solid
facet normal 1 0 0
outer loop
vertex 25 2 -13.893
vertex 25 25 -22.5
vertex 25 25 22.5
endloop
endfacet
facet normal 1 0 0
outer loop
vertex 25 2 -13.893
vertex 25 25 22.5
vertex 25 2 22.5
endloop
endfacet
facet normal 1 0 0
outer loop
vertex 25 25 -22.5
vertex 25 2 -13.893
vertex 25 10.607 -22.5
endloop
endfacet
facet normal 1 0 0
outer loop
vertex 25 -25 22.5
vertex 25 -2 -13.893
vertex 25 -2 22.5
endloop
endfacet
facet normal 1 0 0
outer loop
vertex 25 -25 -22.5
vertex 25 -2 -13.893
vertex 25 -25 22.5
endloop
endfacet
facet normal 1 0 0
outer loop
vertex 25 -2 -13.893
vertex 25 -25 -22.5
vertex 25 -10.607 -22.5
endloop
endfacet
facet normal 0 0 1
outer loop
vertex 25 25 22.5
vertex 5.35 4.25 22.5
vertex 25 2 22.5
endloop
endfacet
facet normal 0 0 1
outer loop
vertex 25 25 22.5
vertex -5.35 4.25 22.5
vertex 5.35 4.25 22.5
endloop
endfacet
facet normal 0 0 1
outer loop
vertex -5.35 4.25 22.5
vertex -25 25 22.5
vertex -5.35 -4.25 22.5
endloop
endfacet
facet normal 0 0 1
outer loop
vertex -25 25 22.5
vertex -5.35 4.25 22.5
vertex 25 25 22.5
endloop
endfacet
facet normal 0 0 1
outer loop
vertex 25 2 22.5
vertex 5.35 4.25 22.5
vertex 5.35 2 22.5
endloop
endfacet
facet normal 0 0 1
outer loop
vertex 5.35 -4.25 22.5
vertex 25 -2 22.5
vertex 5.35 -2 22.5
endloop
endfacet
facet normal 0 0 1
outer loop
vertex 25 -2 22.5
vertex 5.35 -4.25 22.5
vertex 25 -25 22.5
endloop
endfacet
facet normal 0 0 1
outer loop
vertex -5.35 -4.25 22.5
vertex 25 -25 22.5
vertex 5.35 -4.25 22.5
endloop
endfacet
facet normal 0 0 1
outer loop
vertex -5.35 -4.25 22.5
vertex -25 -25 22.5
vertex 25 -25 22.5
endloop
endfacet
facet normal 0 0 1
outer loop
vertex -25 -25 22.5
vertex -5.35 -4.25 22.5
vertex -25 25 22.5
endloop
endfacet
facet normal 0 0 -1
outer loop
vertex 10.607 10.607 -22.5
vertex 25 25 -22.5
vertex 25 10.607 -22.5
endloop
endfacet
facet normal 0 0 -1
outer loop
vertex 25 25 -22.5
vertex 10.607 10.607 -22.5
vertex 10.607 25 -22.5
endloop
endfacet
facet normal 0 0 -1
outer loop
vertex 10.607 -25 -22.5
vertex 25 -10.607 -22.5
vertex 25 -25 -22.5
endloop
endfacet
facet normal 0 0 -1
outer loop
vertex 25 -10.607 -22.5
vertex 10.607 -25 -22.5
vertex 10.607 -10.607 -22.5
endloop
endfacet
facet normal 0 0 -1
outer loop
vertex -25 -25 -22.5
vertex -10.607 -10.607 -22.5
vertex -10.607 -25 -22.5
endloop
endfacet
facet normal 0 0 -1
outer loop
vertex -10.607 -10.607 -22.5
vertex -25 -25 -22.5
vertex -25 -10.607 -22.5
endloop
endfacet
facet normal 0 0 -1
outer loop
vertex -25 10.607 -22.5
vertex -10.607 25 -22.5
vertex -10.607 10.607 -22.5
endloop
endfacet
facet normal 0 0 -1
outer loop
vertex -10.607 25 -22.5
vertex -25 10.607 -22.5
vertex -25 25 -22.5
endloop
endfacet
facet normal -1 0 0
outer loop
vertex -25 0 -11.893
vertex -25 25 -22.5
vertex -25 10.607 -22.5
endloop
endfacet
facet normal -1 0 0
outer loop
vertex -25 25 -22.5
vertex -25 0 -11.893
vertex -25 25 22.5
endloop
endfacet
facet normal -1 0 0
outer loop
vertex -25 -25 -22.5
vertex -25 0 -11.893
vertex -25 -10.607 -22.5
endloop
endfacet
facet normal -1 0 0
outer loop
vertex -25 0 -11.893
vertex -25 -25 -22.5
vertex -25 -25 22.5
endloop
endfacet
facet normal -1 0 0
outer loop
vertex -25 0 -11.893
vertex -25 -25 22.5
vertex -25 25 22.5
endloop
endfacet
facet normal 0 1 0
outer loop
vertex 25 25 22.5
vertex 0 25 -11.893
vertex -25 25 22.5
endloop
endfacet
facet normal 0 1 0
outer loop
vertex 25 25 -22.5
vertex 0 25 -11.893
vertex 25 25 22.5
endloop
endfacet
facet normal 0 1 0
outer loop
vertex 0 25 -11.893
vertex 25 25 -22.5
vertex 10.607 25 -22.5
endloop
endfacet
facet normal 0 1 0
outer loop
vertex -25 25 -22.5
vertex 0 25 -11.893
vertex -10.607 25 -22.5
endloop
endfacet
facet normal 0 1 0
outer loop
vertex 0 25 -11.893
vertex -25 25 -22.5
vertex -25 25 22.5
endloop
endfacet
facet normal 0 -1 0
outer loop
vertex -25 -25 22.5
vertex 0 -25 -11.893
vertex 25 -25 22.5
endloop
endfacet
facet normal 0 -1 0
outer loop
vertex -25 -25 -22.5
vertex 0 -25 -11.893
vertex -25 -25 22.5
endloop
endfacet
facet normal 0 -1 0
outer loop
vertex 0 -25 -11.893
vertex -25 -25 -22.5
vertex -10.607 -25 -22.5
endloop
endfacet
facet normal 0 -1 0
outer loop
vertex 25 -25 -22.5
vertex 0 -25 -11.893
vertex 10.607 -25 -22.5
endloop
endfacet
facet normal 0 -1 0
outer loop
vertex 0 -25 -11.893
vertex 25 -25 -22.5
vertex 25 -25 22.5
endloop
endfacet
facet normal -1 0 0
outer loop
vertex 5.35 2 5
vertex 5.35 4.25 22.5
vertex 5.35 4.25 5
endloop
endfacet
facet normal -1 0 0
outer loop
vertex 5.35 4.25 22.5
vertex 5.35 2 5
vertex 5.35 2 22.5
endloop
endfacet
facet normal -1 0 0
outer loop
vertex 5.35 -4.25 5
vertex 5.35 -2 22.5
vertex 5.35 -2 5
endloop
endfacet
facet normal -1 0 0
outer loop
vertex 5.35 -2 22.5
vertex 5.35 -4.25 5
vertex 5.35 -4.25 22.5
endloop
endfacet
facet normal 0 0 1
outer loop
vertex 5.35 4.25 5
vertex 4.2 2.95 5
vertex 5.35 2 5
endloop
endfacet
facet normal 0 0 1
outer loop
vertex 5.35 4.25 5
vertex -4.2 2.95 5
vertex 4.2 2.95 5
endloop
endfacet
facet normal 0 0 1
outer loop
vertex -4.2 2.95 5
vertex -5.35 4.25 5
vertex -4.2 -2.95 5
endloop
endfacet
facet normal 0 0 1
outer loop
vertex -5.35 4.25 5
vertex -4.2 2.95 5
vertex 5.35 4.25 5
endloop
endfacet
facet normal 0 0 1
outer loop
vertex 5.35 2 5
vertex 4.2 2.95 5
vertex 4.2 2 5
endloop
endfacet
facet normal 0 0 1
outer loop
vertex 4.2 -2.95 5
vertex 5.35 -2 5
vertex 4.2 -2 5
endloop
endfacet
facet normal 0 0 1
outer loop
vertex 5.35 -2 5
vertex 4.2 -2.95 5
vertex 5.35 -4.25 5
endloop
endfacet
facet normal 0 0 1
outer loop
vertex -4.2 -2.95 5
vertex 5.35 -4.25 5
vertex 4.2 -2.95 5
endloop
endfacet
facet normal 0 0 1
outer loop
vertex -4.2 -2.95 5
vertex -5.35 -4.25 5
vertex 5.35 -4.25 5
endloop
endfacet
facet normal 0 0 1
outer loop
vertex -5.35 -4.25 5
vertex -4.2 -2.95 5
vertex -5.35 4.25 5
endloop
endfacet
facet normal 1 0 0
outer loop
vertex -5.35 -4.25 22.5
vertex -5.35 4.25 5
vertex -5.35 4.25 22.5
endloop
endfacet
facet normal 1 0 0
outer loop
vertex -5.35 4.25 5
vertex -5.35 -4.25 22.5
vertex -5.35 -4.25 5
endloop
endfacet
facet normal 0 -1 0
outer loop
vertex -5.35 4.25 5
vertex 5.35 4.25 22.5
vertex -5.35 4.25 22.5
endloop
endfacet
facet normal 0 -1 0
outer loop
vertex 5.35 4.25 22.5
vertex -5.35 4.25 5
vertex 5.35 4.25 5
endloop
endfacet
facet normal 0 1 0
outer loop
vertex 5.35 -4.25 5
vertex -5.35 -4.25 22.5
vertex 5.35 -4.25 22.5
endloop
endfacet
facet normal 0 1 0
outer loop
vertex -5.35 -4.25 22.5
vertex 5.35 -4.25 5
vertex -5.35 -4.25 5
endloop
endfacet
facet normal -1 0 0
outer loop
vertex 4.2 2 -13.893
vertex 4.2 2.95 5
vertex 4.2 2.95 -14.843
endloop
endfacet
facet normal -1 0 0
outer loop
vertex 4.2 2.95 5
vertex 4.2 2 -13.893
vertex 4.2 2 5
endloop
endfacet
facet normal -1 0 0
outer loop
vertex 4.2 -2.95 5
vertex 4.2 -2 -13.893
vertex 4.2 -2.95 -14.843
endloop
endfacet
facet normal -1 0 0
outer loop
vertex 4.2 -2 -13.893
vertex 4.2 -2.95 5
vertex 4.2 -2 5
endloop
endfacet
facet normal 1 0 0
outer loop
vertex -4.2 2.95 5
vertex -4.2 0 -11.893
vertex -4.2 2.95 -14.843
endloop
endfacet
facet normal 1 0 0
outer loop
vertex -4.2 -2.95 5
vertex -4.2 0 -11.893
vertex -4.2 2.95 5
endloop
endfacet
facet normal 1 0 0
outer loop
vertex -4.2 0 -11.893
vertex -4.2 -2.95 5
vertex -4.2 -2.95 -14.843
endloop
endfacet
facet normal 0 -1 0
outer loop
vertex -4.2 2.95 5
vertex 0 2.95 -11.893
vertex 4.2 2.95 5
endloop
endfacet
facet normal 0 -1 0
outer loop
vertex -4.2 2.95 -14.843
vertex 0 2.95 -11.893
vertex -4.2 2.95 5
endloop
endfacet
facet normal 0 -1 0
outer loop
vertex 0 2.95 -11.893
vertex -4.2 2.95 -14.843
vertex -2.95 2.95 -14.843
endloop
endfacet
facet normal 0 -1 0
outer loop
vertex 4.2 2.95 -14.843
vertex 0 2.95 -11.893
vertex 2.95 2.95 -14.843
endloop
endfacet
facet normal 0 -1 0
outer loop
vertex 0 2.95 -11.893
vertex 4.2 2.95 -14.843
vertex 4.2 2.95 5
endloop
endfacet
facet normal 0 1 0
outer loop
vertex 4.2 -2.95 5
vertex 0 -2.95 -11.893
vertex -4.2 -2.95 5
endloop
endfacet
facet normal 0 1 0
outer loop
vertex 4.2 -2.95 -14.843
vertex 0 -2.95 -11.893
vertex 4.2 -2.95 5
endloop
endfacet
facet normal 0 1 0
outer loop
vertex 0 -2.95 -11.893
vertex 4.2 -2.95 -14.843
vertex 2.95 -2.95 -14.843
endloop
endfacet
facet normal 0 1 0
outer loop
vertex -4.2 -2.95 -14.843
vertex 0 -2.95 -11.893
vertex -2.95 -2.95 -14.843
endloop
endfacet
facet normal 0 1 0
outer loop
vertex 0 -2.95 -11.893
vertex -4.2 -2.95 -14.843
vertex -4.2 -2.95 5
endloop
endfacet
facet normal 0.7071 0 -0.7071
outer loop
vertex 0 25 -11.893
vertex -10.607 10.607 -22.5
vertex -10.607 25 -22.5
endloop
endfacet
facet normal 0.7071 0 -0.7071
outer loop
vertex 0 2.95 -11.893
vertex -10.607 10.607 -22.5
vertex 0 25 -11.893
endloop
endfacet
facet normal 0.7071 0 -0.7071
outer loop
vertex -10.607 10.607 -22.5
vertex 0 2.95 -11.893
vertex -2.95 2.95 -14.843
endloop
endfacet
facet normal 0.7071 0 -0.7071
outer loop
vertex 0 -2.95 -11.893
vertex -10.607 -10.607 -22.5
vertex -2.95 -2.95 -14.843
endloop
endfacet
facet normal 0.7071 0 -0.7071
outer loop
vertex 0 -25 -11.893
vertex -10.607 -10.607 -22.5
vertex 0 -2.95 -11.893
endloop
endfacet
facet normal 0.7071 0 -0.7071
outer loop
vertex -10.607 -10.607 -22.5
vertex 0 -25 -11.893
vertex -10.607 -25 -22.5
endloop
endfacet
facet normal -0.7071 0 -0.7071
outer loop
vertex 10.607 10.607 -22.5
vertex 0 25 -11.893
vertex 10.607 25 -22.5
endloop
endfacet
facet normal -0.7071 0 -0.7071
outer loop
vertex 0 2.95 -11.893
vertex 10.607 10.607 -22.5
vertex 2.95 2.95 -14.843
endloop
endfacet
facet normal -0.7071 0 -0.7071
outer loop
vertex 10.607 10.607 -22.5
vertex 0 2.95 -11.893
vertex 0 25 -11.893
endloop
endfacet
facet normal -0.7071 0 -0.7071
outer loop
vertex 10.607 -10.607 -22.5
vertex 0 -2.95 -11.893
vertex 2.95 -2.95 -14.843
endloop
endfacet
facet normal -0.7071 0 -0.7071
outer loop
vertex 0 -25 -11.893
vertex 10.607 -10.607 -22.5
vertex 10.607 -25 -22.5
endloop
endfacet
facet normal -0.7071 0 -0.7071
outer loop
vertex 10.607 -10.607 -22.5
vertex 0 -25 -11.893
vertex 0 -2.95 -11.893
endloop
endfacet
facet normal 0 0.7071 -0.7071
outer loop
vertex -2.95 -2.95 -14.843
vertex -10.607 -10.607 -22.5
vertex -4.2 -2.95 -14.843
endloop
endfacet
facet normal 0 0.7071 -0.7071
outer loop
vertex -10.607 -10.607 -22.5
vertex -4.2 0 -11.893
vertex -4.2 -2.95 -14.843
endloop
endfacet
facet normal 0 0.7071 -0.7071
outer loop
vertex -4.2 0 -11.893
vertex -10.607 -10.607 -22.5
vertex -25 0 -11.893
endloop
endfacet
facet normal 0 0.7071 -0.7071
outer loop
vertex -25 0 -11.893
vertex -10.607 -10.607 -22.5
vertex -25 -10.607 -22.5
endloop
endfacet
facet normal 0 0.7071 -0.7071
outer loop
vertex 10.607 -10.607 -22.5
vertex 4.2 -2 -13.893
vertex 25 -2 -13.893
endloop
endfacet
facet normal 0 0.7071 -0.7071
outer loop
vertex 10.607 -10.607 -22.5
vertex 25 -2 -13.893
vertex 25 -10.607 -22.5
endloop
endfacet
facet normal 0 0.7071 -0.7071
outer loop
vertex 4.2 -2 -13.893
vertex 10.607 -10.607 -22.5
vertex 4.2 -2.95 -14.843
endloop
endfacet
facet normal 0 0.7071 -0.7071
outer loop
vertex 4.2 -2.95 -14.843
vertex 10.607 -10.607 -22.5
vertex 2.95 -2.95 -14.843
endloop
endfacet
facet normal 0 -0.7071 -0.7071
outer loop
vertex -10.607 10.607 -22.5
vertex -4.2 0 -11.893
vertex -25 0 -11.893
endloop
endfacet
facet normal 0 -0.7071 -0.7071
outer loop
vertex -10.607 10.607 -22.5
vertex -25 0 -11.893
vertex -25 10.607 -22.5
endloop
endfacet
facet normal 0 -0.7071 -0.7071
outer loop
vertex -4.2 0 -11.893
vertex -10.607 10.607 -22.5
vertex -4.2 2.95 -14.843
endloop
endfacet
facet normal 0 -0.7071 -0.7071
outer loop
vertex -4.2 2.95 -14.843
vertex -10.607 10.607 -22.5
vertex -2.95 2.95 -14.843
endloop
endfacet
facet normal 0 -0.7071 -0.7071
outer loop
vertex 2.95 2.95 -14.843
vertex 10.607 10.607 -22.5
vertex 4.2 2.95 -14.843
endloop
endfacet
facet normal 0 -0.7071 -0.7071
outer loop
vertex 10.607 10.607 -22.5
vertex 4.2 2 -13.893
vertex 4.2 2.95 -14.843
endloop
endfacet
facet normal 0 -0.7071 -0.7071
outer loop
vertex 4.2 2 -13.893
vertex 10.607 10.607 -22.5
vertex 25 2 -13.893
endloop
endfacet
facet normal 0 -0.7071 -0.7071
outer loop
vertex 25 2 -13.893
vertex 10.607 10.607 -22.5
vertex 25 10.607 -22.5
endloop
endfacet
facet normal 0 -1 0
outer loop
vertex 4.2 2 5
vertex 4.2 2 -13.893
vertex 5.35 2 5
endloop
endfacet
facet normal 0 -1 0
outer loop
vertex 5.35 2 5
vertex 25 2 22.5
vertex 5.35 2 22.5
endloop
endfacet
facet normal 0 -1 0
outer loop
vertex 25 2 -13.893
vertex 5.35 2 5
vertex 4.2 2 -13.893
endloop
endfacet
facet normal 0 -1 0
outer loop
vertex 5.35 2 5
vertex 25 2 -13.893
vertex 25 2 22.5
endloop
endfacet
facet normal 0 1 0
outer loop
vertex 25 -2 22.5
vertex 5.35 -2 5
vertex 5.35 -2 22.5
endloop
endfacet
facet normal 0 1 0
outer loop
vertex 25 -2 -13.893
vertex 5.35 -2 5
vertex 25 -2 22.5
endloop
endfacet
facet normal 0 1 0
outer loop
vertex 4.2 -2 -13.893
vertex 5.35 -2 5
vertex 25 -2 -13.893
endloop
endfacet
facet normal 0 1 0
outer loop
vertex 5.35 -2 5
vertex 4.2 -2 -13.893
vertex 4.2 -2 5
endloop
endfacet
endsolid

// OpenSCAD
// Phone Charging Holder
// by SrAmo, 12/15/2021

height = 45;
cut = 15;
difference() {
    cube([50,50,height],center=true);
    
    translate([0,0,height/2-10+2.5]) cube([10.7,8.5,20],center=true);
    cube([8.4,5.9,height+5],center=true);
    translate([0,0,-height/2]) rotate([90,45,0]) cube([cut,cut,55],center=true);
    translate([0,0,-height/2]) rotate([0,90,0]) rotate([0,0,45]) cube([cut,cut,55],center=true);
    translate([25,0,0]) cube([50,4,50],center=true);
    }
